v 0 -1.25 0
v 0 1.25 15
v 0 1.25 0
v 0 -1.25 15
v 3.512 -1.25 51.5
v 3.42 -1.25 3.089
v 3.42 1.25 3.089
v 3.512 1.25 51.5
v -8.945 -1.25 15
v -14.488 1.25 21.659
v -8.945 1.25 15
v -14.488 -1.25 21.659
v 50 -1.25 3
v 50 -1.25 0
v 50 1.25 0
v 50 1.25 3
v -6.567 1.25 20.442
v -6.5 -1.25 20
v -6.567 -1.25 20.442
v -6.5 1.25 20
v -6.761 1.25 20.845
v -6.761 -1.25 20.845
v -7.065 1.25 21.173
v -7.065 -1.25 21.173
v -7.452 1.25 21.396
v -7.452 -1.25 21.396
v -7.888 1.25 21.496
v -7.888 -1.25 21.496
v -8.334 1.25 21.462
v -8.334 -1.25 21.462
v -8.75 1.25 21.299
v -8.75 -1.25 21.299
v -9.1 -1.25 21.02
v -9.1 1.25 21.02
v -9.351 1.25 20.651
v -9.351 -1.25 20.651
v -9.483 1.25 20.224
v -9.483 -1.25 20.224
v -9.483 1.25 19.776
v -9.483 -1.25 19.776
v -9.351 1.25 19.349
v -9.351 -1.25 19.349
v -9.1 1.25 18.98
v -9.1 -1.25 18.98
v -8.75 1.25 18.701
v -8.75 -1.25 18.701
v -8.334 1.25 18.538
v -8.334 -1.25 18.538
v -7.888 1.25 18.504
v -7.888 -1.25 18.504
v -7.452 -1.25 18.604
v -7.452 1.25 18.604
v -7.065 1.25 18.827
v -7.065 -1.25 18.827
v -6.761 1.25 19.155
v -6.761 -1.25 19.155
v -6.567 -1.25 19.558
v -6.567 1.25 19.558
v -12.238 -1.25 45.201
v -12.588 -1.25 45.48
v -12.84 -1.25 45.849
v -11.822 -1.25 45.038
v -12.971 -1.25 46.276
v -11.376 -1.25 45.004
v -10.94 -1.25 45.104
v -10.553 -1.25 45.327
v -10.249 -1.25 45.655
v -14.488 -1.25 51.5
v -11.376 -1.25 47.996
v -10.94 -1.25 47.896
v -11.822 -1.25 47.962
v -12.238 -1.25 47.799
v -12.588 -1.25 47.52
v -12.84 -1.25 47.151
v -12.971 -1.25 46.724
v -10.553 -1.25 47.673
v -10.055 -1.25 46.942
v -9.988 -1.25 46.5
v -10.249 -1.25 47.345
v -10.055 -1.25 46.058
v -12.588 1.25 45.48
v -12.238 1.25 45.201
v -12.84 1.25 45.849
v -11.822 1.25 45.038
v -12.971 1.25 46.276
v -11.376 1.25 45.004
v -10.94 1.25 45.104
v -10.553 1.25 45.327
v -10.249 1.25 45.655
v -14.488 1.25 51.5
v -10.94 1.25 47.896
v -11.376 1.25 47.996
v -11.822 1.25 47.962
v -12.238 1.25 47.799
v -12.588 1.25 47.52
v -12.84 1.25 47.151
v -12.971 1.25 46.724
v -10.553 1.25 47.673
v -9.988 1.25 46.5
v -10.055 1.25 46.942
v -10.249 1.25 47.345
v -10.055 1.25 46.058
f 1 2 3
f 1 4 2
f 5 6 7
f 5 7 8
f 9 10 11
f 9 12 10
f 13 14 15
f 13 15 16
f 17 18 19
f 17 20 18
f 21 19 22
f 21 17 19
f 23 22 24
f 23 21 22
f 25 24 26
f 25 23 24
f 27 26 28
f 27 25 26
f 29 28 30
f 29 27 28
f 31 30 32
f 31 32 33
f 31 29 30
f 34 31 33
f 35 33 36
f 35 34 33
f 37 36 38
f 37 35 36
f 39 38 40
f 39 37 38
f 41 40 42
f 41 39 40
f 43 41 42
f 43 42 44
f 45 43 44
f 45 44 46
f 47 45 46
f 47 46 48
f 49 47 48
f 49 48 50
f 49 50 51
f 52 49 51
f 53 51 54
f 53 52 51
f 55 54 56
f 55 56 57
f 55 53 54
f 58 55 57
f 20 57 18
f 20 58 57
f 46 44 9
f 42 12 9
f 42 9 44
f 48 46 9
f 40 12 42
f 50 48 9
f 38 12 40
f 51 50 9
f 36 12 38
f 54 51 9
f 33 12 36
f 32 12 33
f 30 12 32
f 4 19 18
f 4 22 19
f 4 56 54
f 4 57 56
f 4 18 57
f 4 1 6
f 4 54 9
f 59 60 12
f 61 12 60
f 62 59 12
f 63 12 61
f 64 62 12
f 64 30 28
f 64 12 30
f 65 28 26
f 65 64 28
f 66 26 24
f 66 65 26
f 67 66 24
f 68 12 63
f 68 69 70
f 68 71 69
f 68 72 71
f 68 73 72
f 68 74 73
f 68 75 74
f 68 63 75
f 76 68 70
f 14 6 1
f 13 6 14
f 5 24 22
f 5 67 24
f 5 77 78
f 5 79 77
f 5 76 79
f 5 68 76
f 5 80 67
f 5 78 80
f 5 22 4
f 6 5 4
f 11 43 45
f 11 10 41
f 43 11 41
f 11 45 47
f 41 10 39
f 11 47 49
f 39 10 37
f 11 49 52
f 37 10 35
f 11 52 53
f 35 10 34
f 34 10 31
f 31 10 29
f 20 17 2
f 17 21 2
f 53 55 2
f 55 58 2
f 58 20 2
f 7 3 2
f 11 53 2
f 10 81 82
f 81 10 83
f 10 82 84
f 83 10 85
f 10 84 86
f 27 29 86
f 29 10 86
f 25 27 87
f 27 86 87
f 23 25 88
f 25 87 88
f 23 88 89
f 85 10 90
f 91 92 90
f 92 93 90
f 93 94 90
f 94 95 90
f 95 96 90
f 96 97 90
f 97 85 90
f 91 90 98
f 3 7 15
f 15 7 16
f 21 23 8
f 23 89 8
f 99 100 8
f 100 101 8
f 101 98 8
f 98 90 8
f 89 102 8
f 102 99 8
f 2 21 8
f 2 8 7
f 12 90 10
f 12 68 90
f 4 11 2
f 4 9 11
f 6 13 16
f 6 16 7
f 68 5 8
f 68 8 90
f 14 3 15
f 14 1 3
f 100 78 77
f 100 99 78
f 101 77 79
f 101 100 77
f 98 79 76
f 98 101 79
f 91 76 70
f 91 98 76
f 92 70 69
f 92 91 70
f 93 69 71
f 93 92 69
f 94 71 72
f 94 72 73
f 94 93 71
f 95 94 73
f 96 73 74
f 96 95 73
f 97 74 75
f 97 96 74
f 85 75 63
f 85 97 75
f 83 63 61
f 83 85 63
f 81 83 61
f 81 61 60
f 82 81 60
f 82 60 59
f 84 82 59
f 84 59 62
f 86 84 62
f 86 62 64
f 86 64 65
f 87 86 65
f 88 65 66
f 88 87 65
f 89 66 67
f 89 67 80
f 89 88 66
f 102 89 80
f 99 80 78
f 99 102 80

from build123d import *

# Parameters (mm, degrees)
F0_R     = 1.5
F1_DEPTH = 1.25


with BuildPart() as f1:
    # F0 (on Front) → F1 (new body, symmetric)
    with BuildSketch(Plane.XZ):
        Polygon((0, 0), (50, 0), (50, 3), (3.419785, 3.088514), (3.511779, 51.5), (-14.488221, 51.5), (-14.488221, 21.658587), (-8.945253, 15), (0, 15), align=None)
        with Locations((-8, 20)):
            Circle(F0_R, mode=Mode.SUBTRACT)
        with Locations((-11.488221, 46.5)):
            Circle(F0_R, mode=Mode.SUBTRACT)
    extrude(amount=F1_DEPTH, both=True)


solid = f1.part
